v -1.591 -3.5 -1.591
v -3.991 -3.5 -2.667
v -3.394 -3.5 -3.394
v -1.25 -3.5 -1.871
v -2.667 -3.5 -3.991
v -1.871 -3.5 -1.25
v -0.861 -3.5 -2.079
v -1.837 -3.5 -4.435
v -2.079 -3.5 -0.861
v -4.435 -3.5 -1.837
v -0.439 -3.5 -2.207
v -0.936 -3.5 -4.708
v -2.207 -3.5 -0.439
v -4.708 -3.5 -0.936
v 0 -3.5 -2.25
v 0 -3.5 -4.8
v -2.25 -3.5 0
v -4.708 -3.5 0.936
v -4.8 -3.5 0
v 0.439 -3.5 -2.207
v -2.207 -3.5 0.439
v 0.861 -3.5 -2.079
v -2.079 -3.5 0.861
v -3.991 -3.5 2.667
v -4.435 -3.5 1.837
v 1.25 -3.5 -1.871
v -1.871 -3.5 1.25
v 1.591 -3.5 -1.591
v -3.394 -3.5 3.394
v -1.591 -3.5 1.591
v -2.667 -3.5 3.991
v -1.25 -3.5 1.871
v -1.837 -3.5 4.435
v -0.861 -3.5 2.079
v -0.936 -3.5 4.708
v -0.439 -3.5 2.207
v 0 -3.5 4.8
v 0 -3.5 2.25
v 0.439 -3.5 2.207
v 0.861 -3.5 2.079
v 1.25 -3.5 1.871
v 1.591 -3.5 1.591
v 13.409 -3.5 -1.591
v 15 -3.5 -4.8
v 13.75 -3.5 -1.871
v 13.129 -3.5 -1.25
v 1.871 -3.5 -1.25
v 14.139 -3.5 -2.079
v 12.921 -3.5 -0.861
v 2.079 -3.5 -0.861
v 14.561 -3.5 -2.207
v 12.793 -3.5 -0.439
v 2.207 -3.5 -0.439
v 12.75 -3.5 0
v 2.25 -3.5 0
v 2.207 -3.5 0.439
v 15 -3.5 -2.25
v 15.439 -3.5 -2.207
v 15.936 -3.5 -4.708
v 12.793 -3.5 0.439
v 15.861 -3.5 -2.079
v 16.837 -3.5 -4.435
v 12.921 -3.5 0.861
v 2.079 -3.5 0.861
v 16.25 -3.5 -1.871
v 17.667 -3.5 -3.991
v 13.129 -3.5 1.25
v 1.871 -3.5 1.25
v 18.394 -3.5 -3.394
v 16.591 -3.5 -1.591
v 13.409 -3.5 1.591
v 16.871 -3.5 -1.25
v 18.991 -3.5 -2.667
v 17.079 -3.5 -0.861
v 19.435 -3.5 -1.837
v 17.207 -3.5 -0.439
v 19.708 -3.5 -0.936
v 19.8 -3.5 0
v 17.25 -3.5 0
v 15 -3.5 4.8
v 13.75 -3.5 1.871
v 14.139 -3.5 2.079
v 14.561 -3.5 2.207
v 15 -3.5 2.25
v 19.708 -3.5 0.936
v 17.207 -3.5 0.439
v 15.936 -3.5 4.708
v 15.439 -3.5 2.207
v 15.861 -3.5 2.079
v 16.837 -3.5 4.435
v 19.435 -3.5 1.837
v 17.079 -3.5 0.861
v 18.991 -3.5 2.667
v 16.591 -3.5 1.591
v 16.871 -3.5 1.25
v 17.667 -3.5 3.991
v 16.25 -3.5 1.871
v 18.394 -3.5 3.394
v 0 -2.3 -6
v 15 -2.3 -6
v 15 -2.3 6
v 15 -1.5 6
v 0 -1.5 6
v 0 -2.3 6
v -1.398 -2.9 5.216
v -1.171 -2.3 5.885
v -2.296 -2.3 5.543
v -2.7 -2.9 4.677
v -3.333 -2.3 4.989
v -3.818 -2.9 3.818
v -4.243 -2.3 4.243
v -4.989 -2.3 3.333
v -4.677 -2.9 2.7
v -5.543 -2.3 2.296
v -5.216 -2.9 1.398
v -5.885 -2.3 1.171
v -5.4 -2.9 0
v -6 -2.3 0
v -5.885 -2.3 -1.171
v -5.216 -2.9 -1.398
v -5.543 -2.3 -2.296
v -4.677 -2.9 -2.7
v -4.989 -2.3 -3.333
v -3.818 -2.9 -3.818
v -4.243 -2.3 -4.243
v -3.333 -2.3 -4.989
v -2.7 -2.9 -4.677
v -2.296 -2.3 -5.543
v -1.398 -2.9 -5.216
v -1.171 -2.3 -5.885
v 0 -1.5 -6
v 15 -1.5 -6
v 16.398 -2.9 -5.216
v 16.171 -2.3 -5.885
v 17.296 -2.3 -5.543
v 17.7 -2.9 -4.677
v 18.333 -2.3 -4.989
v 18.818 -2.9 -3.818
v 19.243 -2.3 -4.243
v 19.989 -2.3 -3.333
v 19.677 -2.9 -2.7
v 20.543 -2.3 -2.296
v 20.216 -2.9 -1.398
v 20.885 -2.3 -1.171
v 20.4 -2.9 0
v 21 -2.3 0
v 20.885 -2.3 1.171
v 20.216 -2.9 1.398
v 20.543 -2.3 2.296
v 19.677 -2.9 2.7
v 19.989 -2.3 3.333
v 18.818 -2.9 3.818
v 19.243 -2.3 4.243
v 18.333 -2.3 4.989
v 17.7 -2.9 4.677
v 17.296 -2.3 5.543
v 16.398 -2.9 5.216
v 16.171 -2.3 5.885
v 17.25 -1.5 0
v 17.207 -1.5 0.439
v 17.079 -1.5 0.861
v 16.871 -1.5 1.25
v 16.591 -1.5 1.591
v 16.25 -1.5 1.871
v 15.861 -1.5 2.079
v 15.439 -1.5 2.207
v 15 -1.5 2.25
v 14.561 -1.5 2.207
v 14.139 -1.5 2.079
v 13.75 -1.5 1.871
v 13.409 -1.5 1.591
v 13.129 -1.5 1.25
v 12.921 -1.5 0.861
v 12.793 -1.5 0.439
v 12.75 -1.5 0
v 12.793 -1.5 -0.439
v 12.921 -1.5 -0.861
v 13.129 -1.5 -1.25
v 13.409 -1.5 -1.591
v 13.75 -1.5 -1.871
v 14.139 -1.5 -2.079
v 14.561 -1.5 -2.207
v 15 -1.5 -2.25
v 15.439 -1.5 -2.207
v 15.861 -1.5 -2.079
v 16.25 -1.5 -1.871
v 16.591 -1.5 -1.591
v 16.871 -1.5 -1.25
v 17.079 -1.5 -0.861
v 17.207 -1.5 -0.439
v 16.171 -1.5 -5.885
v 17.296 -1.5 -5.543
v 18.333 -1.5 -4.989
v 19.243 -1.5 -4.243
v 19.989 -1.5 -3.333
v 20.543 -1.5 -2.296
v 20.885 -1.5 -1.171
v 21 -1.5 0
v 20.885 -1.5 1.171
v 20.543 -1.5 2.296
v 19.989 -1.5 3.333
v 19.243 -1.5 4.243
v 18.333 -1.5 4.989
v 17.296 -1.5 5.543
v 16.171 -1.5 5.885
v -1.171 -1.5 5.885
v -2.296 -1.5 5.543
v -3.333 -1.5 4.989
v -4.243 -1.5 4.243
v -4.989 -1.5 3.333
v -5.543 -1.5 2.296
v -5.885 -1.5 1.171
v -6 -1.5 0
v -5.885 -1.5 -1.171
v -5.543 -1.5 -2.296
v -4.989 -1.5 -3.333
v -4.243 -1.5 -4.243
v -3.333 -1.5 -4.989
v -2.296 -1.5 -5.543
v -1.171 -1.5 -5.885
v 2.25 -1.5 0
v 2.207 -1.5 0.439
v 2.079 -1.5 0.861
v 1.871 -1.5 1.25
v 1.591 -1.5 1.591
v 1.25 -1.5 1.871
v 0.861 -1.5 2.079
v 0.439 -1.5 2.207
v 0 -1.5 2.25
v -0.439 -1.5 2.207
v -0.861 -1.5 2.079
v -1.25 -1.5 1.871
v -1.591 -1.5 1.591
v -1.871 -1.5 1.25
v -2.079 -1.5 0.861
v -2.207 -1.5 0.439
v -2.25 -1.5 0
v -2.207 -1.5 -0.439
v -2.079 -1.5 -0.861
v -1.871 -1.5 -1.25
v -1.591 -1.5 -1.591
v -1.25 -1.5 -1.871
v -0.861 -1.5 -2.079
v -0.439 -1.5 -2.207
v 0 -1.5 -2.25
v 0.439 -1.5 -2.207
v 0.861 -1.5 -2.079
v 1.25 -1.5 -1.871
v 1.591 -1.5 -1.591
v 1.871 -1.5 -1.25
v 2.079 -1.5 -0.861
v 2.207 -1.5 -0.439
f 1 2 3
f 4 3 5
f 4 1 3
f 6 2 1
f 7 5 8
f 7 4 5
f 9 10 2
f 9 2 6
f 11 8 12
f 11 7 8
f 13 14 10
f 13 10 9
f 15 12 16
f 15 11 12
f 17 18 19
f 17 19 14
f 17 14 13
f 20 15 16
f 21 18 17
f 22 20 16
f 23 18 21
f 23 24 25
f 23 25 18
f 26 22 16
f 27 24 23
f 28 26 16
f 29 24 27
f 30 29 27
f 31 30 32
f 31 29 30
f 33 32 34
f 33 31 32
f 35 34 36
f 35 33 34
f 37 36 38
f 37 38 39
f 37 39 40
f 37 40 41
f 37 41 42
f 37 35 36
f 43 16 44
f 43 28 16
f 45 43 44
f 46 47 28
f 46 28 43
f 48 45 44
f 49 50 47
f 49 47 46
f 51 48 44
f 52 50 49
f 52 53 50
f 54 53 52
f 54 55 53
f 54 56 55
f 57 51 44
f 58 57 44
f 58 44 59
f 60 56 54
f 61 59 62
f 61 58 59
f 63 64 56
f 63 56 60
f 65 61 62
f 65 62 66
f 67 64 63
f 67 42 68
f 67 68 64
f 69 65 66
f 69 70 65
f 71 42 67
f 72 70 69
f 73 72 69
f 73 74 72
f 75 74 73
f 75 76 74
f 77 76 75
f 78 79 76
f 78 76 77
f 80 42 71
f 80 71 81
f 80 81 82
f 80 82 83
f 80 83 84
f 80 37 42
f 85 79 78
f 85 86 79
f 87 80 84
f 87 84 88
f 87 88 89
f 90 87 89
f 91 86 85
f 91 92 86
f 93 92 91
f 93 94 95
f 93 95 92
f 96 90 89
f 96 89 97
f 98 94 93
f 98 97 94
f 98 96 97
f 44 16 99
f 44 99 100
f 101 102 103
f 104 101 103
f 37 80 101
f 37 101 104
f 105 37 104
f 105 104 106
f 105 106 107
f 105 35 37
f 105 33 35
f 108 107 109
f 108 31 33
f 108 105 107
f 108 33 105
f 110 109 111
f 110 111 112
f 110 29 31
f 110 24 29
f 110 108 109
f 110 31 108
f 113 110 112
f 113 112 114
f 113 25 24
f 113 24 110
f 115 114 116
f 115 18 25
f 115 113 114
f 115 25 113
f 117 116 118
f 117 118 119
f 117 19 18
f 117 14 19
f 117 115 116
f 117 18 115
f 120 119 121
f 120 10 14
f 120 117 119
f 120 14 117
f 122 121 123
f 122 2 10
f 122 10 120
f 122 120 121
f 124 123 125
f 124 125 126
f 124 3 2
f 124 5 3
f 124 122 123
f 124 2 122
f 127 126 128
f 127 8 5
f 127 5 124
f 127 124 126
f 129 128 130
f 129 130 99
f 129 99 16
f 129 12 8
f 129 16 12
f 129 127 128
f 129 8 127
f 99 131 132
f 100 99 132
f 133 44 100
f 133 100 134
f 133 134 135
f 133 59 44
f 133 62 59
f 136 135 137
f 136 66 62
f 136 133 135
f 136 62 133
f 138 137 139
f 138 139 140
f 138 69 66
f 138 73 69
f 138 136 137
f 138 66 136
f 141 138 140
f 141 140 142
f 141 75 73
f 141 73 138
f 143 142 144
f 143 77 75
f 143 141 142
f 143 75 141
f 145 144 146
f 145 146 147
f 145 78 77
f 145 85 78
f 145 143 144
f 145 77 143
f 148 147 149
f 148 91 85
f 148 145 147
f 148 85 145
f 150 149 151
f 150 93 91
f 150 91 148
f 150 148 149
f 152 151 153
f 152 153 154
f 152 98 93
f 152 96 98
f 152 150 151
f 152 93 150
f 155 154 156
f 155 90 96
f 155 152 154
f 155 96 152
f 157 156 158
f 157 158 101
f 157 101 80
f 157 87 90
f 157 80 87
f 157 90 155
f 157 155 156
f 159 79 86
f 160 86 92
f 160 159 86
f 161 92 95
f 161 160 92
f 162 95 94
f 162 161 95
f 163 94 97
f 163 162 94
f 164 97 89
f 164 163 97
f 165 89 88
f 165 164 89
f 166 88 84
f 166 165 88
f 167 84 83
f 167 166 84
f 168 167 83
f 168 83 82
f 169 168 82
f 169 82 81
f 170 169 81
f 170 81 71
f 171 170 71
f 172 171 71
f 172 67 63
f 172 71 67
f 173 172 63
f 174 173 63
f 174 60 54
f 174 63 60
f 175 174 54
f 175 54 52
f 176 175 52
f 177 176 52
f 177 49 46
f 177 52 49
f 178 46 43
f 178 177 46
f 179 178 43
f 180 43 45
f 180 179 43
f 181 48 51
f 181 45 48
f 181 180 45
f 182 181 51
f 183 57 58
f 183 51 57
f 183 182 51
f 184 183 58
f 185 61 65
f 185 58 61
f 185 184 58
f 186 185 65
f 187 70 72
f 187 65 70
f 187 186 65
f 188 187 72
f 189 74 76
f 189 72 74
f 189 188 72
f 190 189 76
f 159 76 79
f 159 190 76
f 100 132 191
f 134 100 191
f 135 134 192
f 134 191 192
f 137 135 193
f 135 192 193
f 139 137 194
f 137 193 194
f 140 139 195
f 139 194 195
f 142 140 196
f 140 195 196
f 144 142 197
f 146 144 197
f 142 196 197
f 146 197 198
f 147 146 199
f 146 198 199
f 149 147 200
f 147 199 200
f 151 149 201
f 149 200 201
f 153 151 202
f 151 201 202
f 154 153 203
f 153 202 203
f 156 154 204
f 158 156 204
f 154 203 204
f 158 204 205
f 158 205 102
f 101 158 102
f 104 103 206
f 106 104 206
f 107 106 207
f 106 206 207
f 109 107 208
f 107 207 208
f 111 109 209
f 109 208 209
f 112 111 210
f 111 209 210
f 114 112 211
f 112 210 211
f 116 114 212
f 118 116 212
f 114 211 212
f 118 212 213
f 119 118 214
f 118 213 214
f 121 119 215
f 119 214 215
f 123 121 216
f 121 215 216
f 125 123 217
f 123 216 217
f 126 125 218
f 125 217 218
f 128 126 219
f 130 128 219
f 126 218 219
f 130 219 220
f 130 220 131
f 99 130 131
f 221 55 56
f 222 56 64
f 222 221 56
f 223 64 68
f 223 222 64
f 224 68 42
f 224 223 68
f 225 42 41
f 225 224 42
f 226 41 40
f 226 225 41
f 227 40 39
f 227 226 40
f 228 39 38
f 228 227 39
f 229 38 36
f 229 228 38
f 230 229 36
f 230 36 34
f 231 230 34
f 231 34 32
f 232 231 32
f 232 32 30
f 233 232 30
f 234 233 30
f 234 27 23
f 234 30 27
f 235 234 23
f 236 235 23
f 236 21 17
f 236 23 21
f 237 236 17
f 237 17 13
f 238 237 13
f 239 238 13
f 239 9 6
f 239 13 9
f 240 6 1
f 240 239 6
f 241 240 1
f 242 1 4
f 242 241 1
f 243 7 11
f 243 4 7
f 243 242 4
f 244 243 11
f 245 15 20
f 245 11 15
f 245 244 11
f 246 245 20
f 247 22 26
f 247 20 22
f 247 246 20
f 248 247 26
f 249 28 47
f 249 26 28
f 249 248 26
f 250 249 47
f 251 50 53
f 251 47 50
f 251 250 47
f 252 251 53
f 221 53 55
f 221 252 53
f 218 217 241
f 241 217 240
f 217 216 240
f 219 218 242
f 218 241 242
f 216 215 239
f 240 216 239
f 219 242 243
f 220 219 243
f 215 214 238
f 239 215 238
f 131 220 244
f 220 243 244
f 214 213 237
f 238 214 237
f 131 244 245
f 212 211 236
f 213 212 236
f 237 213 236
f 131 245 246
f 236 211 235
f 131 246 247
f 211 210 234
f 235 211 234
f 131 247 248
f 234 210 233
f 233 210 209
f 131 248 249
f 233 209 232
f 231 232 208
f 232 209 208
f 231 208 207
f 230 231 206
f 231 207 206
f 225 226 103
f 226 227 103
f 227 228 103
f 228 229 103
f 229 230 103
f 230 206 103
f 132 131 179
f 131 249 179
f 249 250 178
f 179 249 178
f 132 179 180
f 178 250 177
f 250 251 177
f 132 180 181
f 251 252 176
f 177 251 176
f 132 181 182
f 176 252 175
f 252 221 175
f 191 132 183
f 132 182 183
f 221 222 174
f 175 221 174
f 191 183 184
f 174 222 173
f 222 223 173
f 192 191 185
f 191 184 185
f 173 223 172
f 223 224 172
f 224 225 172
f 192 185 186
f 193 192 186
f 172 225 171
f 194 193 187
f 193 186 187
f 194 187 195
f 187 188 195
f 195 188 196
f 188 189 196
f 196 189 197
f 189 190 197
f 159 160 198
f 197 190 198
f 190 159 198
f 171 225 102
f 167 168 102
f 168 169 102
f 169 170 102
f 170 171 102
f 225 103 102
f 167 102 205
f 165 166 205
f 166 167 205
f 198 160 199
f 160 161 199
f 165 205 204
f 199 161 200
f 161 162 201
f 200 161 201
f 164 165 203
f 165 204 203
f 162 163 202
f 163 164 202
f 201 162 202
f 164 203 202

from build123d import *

# Parameters (mm, degrees)
PAD001_DEPTH    = 2
CHAMFER001_SIZE = 1.2
SKETCH005_R     = 2.25
HOLE001_DEPTH   = 25


with BuildPart() as part:
    # Sketch004 → Pad001 (new body)
    with BuildSketch(Plane.XZ):
        with BuildLine():
            ThreePointArc((0, 6), (-6, 0), (0, -6))
            Line((0, -6), (15, -6))
            ThreePointArc((15, -6), (21, 0), (15, 6))
            Line((15, 6), (0, 6))
        make_face()
    extrude(amount=PAD001_DEPTH)

    # Chamfer001
    chamfer001_edges = [part.edges().sort_by_distance(p)[0] for p in [
        (7.5, -2, 6),
    ]]
    chamfer(chamfer001_edges, length=CHAMFER001_SIZE)

    # Sketch005 → Hole001 (cut)
    with BuildSketch(Plane.XZ):
        Circle(SKETCH005_R)
        with Locations((15, 0)):
            Circle(SKETCH005_R)
    extrude(amount=HOLE001_DEPTH, mode=Mode.SUBTRACT)


with BuildPart() as part_1:
    # Body001 placement: moved
    add(part.part.moved(Location((0, -1.5, 0))))


solid = part_1.part
